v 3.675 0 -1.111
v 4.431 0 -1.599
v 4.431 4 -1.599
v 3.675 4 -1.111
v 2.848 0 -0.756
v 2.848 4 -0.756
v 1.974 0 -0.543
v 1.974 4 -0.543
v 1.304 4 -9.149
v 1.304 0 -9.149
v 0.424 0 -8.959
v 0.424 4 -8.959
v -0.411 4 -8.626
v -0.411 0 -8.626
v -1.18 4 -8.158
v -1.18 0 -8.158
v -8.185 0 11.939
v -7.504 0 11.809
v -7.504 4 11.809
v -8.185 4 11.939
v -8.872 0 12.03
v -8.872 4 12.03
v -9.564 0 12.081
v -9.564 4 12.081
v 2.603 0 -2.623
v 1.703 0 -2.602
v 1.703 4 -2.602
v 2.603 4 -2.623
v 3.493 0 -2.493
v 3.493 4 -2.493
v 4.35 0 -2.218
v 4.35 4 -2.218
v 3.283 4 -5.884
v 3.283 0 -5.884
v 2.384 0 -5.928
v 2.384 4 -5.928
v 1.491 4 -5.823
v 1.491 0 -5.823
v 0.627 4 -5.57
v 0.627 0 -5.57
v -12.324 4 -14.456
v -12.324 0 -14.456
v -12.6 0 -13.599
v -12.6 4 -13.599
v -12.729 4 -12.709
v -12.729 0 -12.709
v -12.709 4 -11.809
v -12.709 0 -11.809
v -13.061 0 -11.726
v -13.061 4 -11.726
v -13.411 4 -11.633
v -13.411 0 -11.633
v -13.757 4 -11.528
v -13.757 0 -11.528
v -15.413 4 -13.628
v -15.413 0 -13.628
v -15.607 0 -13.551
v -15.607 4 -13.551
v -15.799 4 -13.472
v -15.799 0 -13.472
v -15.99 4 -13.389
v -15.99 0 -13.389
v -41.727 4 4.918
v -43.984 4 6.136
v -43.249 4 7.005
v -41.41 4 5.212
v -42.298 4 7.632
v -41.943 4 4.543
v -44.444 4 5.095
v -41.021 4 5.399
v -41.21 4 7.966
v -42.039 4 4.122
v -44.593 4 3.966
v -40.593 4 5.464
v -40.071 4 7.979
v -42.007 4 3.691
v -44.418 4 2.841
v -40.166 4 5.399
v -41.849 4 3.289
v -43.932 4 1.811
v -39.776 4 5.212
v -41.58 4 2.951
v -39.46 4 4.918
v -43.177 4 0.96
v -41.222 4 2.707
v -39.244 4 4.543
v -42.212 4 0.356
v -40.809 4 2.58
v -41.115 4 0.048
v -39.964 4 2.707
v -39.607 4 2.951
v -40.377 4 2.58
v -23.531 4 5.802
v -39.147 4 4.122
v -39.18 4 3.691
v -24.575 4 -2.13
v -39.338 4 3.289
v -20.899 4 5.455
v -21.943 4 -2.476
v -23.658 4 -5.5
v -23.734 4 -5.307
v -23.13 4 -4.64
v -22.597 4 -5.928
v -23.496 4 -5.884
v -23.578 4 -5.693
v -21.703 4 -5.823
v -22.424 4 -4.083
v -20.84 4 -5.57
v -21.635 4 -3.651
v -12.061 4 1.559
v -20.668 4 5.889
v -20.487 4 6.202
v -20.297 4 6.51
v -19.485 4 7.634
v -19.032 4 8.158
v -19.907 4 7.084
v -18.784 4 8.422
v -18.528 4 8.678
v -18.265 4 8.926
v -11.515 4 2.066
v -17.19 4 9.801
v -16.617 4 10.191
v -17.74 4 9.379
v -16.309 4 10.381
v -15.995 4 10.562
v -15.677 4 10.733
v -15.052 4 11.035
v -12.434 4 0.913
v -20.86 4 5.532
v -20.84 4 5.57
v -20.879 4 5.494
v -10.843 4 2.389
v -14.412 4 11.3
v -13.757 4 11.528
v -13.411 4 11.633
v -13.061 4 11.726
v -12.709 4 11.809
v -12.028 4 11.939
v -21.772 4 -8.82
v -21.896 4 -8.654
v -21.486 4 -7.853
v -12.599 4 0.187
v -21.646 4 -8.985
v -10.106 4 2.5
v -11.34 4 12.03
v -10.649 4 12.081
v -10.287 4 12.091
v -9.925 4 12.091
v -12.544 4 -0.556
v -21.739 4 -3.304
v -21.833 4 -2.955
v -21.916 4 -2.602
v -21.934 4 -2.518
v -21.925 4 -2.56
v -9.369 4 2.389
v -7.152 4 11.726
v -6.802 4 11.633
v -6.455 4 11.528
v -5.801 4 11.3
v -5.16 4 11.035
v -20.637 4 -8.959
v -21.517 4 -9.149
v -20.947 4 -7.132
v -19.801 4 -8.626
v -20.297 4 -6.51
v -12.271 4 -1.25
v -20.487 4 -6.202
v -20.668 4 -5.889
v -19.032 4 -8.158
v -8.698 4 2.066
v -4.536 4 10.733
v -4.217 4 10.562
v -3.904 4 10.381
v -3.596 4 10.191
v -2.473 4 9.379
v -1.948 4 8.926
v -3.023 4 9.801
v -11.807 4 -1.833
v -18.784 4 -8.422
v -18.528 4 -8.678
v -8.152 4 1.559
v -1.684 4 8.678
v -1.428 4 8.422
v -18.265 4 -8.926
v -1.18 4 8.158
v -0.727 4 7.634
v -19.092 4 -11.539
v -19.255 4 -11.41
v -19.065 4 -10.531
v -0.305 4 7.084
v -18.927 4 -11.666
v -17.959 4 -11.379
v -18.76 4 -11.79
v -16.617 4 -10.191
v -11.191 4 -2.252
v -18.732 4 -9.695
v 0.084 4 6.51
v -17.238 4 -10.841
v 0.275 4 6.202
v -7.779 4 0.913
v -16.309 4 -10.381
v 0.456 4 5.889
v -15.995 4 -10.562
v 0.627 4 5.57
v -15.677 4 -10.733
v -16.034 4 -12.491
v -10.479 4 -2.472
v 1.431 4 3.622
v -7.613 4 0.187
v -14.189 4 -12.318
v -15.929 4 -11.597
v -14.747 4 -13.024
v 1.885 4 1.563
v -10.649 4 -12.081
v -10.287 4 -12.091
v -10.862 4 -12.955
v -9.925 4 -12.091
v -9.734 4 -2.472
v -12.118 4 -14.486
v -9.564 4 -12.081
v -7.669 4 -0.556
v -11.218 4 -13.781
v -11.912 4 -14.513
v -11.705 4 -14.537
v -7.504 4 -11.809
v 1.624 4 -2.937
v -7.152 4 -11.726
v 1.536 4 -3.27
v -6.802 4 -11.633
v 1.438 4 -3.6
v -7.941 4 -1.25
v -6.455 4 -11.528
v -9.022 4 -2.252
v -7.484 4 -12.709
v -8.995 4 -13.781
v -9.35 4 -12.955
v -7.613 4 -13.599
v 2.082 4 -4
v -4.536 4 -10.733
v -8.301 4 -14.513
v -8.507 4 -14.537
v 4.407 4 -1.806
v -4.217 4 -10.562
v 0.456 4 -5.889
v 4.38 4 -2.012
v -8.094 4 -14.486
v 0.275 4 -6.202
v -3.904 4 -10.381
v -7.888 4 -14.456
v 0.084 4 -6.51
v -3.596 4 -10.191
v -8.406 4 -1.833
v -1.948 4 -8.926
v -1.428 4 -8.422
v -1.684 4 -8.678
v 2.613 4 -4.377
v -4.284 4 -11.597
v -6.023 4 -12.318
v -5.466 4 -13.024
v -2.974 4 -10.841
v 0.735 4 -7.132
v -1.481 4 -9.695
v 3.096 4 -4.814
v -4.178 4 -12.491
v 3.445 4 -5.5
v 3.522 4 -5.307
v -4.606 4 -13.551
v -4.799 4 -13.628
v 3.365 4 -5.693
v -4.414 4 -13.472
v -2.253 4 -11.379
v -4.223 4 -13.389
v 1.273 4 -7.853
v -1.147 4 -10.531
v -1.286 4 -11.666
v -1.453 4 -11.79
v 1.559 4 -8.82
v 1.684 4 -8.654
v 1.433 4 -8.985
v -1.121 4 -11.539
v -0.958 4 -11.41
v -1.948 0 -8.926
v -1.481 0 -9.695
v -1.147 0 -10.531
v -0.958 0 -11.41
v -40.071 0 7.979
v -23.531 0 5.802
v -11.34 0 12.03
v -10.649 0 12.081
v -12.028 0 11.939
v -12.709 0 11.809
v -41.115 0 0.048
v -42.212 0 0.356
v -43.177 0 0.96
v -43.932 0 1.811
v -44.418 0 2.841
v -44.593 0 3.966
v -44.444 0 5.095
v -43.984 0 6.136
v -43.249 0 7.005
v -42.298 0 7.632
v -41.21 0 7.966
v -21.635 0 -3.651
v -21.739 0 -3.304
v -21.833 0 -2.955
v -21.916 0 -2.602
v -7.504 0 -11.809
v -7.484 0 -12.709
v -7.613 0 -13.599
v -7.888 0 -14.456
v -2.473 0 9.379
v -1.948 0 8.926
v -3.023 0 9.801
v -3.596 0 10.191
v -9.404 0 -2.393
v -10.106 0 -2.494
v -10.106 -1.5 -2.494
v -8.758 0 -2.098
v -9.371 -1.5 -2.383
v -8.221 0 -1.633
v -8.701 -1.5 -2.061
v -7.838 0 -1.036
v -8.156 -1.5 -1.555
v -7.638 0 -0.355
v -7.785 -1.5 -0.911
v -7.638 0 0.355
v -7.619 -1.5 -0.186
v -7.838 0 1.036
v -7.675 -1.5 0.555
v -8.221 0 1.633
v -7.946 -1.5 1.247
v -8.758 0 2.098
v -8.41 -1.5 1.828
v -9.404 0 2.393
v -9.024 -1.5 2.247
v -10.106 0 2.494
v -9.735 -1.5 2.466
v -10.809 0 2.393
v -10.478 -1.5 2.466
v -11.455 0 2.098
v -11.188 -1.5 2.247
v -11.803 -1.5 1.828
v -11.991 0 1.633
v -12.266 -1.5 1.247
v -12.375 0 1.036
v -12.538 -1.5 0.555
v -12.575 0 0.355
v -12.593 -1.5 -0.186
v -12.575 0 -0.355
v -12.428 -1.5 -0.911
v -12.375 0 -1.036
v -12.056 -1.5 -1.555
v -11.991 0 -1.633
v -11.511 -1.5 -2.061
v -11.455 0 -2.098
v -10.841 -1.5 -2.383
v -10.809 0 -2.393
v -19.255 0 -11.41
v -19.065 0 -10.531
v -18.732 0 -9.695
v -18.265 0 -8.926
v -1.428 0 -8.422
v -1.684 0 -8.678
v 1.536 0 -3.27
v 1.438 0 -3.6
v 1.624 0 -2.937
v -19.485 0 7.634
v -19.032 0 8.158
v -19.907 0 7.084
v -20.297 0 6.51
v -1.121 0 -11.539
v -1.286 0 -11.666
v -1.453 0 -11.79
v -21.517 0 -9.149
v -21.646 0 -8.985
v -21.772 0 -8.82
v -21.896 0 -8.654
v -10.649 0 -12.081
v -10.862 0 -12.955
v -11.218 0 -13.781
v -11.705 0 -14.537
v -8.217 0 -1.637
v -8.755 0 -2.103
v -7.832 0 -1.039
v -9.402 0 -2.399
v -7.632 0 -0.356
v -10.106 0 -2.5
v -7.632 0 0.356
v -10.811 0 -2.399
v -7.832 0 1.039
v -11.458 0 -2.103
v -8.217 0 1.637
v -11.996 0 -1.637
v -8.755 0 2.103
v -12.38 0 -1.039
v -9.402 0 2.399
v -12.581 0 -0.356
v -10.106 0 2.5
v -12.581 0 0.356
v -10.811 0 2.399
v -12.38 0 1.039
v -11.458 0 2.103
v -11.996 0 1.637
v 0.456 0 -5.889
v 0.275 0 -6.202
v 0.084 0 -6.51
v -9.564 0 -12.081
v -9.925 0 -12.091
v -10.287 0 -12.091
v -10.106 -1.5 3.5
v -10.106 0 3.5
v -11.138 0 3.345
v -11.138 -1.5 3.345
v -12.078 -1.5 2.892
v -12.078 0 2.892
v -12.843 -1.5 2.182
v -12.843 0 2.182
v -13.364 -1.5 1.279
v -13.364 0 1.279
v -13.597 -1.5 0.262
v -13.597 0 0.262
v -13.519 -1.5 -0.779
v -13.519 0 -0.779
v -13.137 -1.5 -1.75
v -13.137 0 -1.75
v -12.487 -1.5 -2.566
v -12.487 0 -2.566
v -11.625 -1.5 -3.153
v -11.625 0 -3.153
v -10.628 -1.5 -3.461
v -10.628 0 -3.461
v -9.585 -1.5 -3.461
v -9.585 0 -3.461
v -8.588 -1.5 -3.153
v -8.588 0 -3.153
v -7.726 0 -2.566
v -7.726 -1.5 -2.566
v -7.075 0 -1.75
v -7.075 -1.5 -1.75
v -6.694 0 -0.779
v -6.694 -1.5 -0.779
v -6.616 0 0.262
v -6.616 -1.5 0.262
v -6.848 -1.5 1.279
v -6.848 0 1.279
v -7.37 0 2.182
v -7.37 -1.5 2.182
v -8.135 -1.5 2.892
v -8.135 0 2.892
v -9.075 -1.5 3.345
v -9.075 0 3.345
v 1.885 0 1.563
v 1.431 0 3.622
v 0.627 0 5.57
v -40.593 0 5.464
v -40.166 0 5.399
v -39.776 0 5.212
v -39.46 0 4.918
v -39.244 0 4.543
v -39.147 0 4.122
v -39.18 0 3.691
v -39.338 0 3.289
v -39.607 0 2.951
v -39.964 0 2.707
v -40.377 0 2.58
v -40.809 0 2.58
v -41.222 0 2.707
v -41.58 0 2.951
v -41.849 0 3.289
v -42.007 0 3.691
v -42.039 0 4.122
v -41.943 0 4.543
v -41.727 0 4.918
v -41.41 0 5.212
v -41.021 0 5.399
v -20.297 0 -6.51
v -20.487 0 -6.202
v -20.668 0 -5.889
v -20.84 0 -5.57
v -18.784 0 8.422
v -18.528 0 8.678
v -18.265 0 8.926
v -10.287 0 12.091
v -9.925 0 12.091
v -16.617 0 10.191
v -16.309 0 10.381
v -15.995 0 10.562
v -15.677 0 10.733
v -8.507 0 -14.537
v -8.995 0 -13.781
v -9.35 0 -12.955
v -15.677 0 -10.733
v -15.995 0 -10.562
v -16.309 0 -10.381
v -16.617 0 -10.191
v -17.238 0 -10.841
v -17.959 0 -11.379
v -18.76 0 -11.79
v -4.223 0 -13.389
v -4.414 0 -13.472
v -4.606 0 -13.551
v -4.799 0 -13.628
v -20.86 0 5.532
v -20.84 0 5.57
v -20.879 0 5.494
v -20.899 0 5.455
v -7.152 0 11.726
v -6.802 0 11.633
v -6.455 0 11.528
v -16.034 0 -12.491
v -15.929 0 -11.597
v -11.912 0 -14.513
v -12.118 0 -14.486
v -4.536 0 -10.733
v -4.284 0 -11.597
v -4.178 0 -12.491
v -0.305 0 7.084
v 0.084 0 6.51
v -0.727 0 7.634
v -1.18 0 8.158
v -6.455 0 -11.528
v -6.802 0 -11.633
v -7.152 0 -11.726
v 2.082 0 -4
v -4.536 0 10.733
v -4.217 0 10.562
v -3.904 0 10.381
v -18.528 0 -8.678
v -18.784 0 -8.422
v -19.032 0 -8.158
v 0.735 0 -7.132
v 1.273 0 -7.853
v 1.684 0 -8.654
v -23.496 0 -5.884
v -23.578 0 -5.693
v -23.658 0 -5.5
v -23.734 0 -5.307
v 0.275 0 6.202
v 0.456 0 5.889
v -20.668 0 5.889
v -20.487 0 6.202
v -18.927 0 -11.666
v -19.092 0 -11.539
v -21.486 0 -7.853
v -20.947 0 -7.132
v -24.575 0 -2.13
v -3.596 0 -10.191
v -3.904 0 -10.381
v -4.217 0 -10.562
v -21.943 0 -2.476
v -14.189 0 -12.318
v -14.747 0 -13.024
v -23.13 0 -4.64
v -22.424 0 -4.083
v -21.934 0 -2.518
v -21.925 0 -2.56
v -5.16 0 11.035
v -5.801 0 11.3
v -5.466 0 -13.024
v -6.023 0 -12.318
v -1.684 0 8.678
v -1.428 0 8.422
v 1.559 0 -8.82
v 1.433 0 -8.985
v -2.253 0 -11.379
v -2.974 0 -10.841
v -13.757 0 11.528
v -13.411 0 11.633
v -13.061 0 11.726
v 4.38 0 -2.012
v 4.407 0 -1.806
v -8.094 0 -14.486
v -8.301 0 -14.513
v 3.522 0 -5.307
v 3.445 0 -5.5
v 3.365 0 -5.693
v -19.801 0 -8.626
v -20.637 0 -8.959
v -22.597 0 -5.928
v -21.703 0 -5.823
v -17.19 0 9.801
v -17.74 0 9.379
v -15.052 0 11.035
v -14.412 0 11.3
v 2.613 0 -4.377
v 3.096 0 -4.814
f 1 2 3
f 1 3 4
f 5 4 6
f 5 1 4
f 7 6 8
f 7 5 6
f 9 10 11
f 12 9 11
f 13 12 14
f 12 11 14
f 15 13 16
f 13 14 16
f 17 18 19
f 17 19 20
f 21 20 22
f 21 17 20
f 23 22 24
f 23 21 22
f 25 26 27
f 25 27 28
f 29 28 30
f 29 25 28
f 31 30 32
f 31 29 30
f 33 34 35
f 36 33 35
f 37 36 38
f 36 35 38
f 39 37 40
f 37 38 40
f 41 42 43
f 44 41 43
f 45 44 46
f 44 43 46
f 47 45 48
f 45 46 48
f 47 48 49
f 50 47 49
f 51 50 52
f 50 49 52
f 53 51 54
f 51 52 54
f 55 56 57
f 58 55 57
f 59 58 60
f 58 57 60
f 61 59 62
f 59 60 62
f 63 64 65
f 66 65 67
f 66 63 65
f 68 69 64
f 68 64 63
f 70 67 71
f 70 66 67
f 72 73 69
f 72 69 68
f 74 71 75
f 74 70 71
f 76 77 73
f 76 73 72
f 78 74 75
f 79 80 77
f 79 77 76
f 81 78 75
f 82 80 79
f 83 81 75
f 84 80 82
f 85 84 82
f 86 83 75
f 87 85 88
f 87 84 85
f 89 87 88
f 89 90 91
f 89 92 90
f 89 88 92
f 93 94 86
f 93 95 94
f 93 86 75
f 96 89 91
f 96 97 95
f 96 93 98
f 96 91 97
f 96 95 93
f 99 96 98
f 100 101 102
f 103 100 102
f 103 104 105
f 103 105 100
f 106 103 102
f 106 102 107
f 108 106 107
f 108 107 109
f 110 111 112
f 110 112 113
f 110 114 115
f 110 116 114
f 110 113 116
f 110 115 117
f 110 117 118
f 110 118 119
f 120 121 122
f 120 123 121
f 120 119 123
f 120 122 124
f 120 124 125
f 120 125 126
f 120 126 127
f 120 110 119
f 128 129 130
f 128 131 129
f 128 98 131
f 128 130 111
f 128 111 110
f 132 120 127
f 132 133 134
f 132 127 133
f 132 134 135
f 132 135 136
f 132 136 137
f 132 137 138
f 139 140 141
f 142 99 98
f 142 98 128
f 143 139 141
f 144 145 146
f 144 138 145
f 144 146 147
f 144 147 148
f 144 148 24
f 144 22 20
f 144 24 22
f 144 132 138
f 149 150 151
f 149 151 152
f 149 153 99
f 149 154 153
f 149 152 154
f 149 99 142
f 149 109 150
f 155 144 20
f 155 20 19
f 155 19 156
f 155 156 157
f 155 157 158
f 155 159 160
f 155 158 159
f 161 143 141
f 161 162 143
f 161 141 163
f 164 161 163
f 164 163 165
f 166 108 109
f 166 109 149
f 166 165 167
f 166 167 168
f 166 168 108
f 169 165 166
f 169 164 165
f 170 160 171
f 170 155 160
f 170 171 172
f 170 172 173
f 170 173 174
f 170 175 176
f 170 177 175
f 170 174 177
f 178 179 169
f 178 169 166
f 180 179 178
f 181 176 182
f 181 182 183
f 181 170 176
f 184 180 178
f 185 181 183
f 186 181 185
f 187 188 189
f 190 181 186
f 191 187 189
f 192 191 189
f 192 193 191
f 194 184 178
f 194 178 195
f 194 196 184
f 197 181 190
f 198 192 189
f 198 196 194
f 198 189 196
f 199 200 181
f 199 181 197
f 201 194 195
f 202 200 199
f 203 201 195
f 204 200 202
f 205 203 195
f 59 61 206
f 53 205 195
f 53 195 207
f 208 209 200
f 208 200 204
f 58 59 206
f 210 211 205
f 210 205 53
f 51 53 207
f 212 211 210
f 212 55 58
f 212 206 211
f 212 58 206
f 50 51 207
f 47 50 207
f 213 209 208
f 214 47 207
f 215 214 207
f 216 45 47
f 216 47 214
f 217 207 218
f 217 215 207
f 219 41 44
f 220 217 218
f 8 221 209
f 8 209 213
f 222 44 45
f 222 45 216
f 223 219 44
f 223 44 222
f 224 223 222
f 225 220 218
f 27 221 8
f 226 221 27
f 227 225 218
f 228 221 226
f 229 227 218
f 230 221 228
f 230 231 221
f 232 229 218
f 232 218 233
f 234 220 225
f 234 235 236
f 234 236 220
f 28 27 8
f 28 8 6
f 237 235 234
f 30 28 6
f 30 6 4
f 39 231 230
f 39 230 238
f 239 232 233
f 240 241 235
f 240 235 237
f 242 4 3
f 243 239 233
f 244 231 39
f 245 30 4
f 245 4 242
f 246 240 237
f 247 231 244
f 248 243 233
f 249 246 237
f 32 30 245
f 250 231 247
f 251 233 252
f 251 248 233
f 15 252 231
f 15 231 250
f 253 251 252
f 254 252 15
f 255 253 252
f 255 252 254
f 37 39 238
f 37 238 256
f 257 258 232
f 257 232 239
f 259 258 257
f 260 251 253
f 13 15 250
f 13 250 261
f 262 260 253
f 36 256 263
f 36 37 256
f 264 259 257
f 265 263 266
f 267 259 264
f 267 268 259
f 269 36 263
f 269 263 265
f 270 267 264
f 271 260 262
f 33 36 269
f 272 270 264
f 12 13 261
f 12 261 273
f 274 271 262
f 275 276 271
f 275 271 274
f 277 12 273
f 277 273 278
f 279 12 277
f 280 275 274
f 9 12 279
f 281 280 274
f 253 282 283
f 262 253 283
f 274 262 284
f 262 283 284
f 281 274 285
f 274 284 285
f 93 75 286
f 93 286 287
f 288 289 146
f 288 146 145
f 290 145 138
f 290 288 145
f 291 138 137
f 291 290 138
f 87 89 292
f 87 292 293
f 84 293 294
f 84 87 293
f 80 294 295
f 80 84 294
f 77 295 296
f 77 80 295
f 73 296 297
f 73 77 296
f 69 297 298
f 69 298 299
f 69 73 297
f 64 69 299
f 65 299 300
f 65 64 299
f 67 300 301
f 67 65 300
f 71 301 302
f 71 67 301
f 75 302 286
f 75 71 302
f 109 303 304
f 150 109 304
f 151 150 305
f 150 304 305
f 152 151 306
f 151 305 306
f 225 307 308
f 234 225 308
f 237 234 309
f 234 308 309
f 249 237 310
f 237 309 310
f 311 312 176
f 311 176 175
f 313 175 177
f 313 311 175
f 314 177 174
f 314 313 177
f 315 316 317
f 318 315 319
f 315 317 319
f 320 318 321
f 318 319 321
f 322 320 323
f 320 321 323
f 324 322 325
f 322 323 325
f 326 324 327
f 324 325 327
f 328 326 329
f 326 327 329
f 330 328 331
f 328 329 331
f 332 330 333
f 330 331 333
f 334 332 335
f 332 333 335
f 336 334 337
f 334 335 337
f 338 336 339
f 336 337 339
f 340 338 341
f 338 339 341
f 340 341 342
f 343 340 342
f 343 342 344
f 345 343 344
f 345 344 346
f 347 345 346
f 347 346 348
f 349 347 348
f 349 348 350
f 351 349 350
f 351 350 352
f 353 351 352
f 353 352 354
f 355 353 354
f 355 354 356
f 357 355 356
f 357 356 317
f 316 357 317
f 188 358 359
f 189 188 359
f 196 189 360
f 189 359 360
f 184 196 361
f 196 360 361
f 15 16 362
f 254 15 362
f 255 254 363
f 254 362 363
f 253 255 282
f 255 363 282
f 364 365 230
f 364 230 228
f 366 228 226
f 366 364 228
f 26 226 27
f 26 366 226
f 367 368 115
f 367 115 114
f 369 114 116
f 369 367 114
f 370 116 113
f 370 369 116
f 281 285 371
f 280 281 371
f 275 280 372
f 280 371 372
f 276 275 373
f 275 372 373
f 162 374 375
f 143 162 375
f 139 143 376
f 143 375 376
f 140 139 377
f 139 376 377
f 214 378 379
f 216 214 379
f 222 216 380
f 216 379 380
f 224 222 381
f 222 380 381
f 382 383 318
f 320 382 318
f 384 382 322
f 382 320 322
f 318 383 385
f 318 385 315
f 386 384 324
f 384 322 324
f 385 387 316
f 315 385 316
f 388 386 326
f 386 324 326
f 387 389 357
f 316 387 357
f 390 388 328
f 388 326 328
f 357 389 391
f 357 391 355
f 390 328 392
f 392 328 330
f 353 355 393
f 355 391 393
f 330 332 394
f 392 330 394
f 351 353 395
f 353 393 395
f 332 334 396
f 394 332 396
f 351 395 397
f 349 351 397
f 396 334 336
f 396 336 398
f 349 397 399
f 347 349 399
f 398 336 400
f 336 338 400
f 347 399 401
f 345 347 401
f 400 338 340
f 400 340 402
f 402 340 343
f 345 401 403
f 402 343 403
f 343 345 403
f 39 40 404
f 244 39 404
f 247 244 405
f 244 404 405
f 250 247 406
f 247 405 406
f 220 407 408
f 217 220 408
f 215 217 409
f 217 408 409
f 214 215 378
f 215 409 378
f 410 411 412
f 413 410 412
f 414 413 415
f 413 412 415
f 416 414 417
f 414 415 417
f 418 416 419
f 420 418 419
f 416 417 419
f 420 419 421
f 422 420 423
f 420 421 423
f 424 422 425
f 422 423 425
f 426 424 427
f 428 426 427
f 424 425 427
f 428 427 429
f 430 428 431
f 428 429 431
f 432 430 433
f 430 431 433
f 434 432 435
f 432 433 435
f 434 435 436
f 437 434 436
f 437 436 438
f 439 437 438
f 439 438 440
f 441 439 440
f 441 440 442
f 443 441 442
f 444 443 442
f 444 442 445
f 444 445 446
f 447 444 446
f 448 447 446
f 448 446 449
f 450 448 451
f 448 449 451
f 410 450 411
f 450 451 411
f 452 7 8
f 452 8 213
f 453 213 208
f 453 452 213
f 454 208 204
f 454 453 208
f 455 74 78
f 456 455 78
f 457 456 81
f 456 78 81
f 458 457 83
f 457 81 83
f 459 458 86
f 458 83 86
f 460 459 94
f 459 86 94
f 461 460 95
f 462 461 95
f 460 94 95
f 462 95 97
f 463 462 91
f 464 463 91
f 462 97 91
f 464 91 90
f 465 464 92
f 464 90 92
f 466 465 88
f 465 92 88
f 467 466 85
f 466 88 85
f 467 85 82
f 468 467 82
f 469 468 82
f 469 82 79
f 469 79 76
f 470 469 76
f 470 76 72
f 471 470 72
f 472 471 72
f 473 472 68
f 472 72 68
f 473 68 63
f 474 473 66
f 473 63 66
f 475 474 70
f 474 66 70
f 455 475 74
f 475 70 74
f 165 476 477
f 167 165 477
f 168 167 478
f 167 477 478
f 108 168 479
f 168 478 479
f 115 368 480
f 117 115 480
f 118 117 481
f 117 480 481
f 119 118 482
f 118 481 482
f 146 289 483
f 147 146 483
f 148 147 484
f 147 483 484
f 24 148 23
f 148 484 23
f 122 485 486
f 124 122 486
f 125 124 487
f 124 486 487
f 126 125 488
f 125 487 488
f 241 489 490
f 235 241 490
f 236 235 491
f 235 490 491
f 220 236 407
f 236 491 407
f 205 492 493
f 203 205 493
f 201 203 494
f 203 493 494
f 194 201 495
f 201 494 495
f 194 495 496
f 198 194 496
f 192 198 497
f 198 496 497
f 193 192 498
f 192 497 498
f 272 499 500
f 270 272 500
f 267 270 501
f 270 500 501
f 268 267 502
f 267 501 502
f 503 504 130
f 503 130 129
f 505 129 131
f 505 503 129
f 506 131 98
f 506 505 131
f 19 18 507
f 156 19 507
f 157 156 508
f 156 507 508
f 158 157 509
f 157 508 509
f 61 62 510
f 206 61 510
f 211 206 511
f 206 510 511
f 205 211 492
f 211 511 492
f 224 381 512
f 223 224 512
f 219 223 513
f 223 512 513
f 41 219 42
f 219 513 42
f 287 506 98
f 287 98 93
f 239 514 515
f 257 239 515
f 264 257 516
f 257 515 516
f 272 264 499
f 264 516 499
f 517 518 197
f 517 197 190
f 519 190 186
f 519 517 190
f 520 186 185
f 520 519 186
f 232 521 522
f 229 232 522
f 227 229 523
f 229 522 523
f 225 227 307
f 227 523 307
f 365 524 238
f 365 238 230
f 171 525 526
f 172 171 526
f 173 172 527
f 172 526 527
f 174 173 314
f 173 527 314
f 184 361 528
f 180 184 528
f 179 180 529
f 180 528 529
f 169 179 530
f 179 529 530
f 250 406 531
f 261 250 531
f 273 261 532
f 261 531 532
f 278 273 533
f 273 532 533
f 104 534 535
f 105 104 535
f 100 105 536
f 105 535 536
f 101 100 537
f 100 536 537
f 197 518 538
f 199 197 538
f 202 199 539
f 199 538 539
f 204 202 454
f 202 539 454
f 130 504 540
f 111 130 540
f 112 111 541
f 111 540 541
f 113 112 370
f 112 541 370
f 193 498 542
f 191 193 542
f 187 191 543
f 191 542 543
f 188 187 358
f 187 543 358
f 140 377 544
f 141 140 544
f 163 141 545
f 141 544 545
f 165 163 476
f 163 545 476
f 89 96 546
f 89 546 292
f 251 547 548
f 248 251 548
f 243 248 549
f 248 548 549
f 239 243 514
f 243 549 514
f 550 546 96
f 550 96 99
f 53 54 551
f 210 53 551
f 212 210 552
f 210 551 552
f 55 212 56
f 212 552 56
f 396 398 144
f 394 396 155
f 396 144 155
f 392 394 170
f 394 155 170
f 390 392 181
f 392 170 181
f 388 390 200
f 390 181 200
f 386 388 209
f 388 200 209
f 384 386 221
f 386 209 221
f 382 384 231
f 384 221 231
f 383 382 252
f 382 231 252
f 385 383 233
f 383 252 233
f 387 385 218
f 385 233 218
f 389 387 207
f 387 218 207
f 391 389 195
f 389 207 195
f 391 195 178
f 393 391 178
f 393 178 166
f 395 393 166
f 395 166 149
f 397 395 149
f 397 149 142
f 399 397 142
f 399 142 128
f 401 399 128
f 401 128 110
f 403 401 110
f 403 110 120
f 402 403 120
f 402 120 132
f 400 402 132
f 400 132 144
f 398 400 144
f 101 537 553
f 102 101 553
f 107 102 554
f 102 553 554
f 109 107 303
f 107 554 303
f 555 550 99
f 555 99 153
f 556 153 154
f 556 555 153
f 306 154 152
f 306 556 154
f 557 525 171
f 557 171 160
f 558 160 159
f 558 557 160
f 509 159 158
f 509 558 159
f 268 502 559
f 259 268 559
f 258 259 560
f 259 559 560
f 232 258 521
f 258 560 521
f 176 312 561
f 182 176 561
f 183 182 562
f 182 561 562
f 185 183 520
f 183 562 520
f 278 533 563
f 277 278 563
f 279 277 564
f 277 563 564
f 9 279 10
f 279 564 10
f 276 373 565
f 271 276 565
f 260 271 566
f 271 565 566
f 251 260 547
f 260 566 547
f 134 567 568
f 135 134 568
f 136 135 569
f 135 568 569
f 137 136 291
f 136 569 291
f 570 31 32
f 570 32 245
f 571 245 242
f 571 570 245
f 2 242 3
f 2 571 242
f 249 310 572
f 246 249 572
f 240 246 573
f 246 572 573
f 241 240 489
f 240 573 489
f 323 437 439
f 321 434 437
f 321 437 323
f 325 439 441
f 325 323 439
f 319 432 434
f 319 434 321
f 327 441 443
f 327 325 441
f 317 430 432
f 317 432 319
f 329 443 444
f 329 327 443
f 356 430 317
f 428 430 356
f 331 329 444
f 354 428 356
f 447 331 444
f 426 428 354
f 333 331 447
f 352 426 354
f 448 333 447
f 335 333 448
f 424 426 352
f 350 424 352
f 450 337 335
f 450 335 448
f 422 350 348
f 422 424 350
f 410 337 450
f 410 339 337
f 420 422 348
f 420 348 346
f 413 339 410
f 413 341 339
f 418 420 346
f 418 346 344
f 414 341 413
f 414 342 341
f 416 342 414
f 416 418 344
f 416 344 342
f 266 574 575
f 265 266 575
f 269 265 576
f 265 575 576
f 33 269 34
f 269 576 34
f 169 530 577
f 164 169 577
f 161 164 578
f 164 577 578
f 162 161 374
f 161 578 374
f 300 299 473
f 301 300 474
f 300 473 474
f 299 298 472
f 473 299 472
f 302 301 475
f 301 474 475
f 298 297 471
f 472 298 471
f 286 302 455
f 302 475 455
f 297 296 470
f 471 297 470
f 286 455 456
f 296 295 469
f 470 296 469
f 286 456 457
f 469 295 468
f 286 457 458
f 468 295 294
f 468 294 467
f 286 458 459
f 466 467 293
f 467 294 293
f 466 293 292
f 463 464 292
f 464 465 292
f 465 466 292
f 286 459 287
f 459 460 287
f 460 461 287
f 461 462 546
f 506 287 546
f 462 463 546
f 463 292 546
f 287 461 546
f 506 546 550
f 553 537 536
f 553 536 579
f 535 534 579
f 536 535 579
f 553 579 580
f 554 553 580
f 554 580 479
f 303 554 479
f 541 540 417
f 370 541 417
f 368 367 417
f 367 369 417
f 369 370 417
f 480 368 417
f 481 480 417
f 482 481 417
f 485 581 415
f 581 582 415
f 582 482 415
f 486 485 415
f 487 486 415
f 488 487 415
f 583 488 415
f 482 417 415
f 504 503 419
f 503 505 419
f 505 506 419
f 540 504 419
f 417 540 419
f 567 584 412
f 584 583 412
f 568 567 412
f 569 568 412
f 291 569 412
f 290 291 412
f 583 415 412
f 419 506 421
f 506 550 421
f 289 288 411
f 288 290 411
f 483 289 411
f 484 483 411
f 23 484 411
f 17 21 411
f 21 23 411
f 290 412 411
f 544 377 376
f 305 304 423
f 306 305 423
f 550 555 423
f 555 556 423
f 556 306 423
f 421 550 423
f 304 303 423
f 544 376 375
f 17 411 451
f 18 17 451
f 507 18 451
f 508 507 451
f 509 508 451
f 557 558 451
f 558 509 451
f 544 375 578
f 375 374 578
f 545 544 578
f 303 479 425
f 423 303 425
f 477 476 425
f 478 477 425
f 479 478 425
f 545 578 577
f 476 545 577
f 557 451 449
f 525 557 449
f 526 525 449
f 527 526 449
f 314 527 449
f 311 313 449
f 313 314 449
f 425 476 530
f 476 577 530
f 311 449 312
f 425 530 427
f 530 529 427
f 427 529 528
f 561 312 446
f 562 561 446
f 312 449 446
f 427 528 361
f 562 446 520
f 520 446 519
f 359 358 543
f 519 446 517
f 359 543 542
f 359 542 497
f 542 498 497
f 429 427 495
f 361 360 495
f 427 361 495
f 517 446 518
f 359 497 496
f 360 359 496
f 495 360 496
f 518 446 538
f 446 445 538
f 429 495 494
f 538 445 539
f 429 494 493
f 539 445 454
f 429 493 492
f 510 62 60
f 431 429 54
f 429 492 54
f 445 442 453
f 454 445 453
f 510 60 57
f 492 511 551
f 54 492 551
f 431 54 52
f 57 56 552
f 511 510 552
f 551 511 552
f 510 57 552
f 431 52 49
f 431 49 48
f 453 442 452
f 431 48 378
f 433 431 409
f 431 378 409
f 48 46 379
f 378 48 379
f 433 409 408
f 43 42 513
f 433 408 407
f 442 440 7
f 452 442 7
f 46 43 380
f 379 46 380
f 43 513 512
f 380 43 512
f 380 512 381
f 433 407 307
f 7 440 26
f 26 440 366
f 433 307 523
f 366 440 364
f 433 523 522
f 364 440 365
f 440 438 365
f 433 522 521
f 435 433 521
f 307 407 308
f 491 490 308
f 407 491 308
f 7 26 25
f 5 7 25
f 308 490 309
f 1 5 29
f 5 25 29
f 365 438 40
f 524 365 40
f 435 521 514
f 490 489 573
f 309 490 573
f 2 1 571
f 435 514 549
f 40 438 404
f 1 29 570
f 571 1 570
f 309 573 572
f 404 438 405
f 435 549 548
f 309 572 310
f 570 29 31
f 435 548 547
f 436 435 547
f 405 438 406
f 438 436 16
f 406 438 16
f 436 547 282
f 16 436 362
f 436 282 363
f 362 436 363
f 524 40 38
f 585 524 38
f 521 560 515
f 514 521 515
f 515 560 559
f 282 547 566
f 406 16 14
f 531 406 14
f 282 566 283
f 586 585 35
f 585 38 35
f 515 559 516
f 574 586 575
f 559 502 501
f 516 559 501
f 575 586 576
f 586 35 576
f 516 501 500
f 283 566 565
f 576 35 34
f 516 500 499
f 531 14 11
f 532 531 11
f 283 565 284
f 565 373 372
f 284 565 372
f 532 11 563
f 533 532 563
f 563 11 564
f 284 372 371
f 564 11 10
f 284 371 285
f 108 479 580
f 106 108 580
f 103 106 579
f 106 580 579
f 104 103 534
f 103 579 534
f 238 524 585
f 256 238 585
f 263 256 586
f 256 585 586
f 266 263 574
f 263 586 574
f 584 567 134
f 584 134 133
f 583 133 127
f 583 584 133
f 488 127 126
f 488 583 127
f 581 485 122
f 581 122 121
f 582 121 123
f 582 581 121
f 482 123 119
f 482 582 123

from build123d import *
from build123d.topology import SkipClean

# Parameters (mm, degrees)
SKETCH1_R           = 1.5
BOSS_EXTRUDE1_DEPTH = 4
SKETCH3_R           = 1.45
BOSS_EXTRUDE2_DEPTH = 4
CUT_EXTRUDE1_START  = -4
CUT_EXTRUDE1_DEPTH  = 4
CUT_EXTRUDE2_REACH  = 49.073
SKETCH5_R           = 2.5
SKETCH6_R           = 3.5
BOSS_EXTRUDE3_DEPTH = 1.5
SKETCH7_R           = 2.494074769
CUT_EXTRUDE3_DEPTH  = 48.224394497


with BuildPart() as part:
    # Sketch1 → Boss-Extrude1 (new body)
    with BuildSketch(Plane(origin=(0, 0, 0), x_dir=(1, 0, 0), z_dir=(0, 1, 0))):
        with BuildLine():
            Line((20.643657446, 4), (2.081641936, 4))
            ThreePointArc((2.081641936, 4), (2.861028333, 4.588201733), (3.521749436, 5.30713988))
            ThreePointArc((3.521749436, 5.30713988), (3.405395609, 5.596745198), (3.282888305, 5.883801663))
            ThreePointArc((3.282888305, 5.883801663), (1.93527598, 5.894040025), (0.627094961, 5.57027124))
            ThreePointArc((0.627094961, 5.57027124), (0.366286148, 6.046375), (0.084372603, 6.510293938))
            ThreePointArc((0.084372603, 6.510293938), (1.018855105, 7.48132754), (1.683794586, 8.65351323))
            ThreePointArc((1.683794586, 8.65351323), (1.496450048, 8.903135899), (1.303821399, 9.148703928))
            ThreePointArc((1.303821399, 9.148703928), (-0.000522033, 8.809805691), (-1.180330337, 8.158486898))
            ThreePointArc((-1.180330337, 8.158486898), (-1.555477026, 8.550865528), (-1.947855656, 8.926012217))
            ThreePointArc((-1.947855656, 8.926012217), (-1.296536862, 10.105820521), (-0.957638625, 11.410163953))
            ThreePointArc((-0.957638625, 11.410163953), (-1.203206655, 11.602792602), (-1.452829324, 11.79013714))
            ThreePointArc((-1.452829324, 11.79013714), (-2.625015014, 11.125197659), (-3.596048616, 10.190715157))
            ThreePointArc((-3.596048616, 10.190715157), (-4.059967554, 10.472628702), (-4.536071314, 10.733437515))
            ThreePointArc((-4.536071314, 10.733437515), (-4.212302529, 12.041618533), (-4.222540891, 13.389230859))
            ThreePointArc((-4.222540891, 13.389230859), (-4.509597355, 13.511738163), (-4.799202674, 13.62809199))
            ThreePointArc((-4.799202674, 13.62809199), (-5.759348103, 12.682425791), (-6.455432668, 11.528463019))
            ThreePointArc((-6.455432668, 11.528463019), (-6.976508546, 11.680699536), (-7.503891752, 11.809396783))
            ThreePointArc((-7.503891752, 11.809396783), (-7.529737283, 13.156800143), (-7.888414517, 14.455843809))
            ThreePointArc((-7.888414517, 14.455843809), (-8.197396993, 14.499881098), (-8.507248835, 14.537314892))
            ThreePointArc((-8.507248835, 14.537314892), (-9.18992168, 13.375367565), (-9.563620196, 12.080565177))
            ThreePointArc((-9.563620196, 12.080565177), (-10.106342554, 12.09275), (-10.649064912, 12.080565177))
            ThreePointArc((-10.649064912, 12.080565177), (-11.022763428, 13.375367565), (-11.705436272, 14.537314892))
            ThreePointArc((-11.705436272, 14.537314892), (-12.015288115, 14.499881098), (-12.324270591, 14.455843809))
            ThreePointArc((-12.324270591, 14.455843809), (-12.682947825, 13.156800143), (-12.708793355, 11.809396783))
            ThreePointArc((-12.708793355, 11.809396783), (-13.236176561, 11.680699536), (-13.757252439, 11.528463019))
            ThreePointArc((-13.757252439, 11.528463019), (-14.453337005, 12.682425791), (-15.413482434, 13.62809199))
            ThreePointArc((-15.413482434, 13.62809199), (-15.703087752, 13.511738163), (-15.990144217, 13.389230859))
            ThreePointArc((-15.990144217, 13.389230859), (-16.000382579, 12.041618533), (-15.676613793, 10.733437515))
            ThreePointArc((-15.676613793, 10.733437515), (-16.152717554, 10.472628702), (-16.616636492, 10.190715157))
            ThreePointArc((-16.616636492, 10.190715157), (-17.587670094, 11.125197659), (-18.759855783, 11.79013714))
            ThreePointArc((-18.759855783, 11.79013714), (-19.009478453, 11.602792602), (-19.255046482, 11.410163953))
            ThreePointArc((-19.255046482, 11.410163953), (-18.916148245, 10.105820521), (-18.264829452, 8.926012217))
            ThreePointArc((-18.264829452, 8.926012217), (-18.657208082, 8.550865528), (-19.032354771, 8.158486898))
            ThreePointArc((-19.032354771, 8.158486898), (-20.212163074, 8.809805691), (-21.516506507, 9.148703928))
            ThreePointArc((-21.516506507, 9.148703928), (-21.709135156, 8.903135899), (-21.896479694, 8.65351323))
            ThreePointArc((-21.896479694, 8.65351323), (-21.231540213, 7.48132754), (-20.297057711, 6.510293938))
            ThreePointArc((-20.297057711, 6.510293938), (-20.578971255, 6.046375), (-20.839780068, 5.57027124))
            ThreePointArc((-20.839780068, 5.57027124), (-22.147961087, 5.894040025), (-23.495573413, 5.883801663))
            ThreePointArc((-23.495573413, 5.883801663), (-23.618080717, 5.596745198), (-23.734434544, 5.30713988))
            ThreePointArc((-23.734434544, 5.30713988), (-22.788768345, 4.346994451), (-21.634805572, 3.650909885))
            ThreePointArc((-21.634805572, 3.650909885), (-21.78704209, 3.129834008), (-21.915739337, 2.602450802))
            ThreePointArc((-21.915739337, 2.602450802), (-23.263142697, 2.576605271), (-24.562186363, 2.217928037))
            ThreePointArc((-24.562186363, 2.217928037), (-24.606223651, 1.908945561), (-24.643657446, 1.599093719))
            ThreePointArc((-24.643657446, 1.599093719), (-23.481710119, 0.916420874), (-22.186907731, 0.542722358))
            ThreePointArc((-22.186907731, 0.542722358), (-22.199092554, 0), (-22.186907731, -0.542722358))
            ThreePointArc((-22.186907731, -0.542722358), (-23.481710119, -0.916420874), (-24.643657446, -1.599093719))
            ThreePointArc((-24.643657446, -1.599093719), (-24.606223651, -1.908945561), (-24.562186363, -2.217928037))
            ThreePointArc((-24.562186363, -2.217928037), (-23.263142697, -2.576605271), (-21.915739337, -2.602450802))
            ThreePointArc((-21.915739337, -2.602450802), (-21.78704209, -3.129834008), (-21.634805572, -3.650909885))
            ThreePointArc((-21.634805572, -3.650909885), (-22.788768345, -4.346994451), (-23.734434544, -5.30713988))
            ThreePointArc((-23.734434544, -5.30713988), (-23.618080717, -5.596745198), (-23.495573413, -5.883801663))
            ThreePointArc((-23.495573413, -5.883801663), (-22.147961087, -5.894040025), (-20.839780068, -5.57027124))
            ThreePointArc((-20.839780068, -5.57027124), (-20.578971255, -6.046375), (-20.297057711, -6.510293938))
            ThreePointArc((-20.297057711, -6.510293938), (-21.231540213, -7.48132754), (-21.896479694, -8.65351323))
            ThreePointArc((-21.896479694, -8.65351323), (-21.709135156, -8.903135899), (-21.516506507, -9.148703928))
            ThreePointArc((-21.516506507, -9.148703928), (-20.212163074, -8.809805691), (-19.032354771, -8.158486898))
            ThreePointArc((-19.032354771, -8.158486898), (-18.657208082, -8.550865528), (-18.264829452, -8.926012217))
            ThreePointArc((-18.264829452, -8.926012217), (-18.916148245, -10.105820521), (-19.255046482, -11.410163953))
            ThreePointArc((-19.255046482, -11.410163953), (-19.009478453, -11.602792602), (-18.759855783, -11.79013714))
            ThreePointArc((-18.759855783, -11.79013714), (-17.587670094, -11.125197659), (-16.616636492, -10.190715157))
            ThreePointArc((-16.616636492, -10.190715157), (-16.152717554, -10.472628702), (-15.676613793, -10.733437515))
            ThreePointArc((-15.676613793, -10.733437515), (-16.000382579, -12.041618533), (-15.990144217, -13.389230859))
            ThreePointArc((-15.990144217, -13.389230859), (-15.703087752, -13.511738163), (-15.413482434, -13.62809199))
            ThreePointArc((-15.413482434, -13.62809199), (-14.453337005, -12.682425791), (-13.757252439, -11.528463019))
            ThreePointArc((-13.757252439, -11.528463019), (-13.236176561, -11.680699536), (-12.708793355, -11.809396783))
            ThreePointArc((-12.708793355, -11.809396783), (-12.682947825, -13.156800143), (-12.324270591, -14.455843809))
            ThreePointArc((-12.324270591, -14.455843809), (-12.015288115, -14.499881098), (-11.705436272, -14.537314892))
            ThreePointArc((-11.705436272, -14.537314892), (-11.022763428, -13.375367565), (-10.649064912, -12.080565177))
            ThreePointArc((-10.649064912, -12.080565177), (-10.106342554, -12.09275), (-9.563620196, -12.080565177))
            ThreePointArc((-9.563620196, -12.080565177), (-9.18992168, -13.375367565), (-8.507248835, -14.537314892))
            ThreePointArc((-8.507248835, -14.537314892), (-8.197396993, -14.499881098), (-7.888414517, -14.455843809))
            ThreePointArc((-7.888414517, -14.455843809), (-7.529737283, -13.156800143), (-7.503891752, -11.809396783))
            ThreePointArc((-7.503891752, -11.809396783), (-6.976508546, -11.680699536), (-6.455432668, -11.528463019))
            ThreePointArc((-6.455432668, -11.528463019), (-5.759348103, -12.682425791), (-4.799202674, -13.62809199))
            ThreePointArc((-4.799202674, -13.62809199), (-4.509597355, -13.511738163), (-4.222540891, -13.389230859))
            ThreePointArc((-4.222540891, -13.389230859), (-4.212302529, -12.041618533), (-4.536071314, -10.733437515))
            ThreePointArc((-4.536071314, -10.733437515), (-4.059967554, -10.472628702), (-3.596048616, -10.190715157))
            ThreePointArc((-3.596048616, -10.190715157), (-2.625015014, -11.125197659), (-1.452829324, -11.79013714))
            ThreePointArc((-1.452829324, -11.79013714), (-1.203206655, -11.602792602), (-0.957638625, -11.410163953))
            ThreePointArc((-0.957638625, -11.410163953), (-1.296536862, -10.105820521), (-1.947855656, -8.926012217))
            ThreePointArc((-1.947855656, -8.926012217), (-1.555477026, -8.550865528), (-1.180330337, -8.158486898))
            ThreePointArc((-1.180330337, -8.158486898), (-0.000522033, -8.809805691), (1.303821399, -9.148703928))
            ThreePointArc((1.303821399, -9.148703928), (1.496450048, -8.903135899), (1.683794586, -8.65351323))
            ThreePointArc((1.683794586, -8.65351323), (1.018855105, -7.48132754), (0.084372603, -6.510293938))
            ThreePointArc((0.084372603, -6.510293938), (0.366286148, -6.046375), (0.627094961, -5.57027124))
            ThreePointArc((0.627094961, -5.57027124), (1.93527598, -5.894040025), (3.282888305, -5.883801663))
            ThreePointArc((3.282888305, -5.883801663), (3.405395609, -5.596745198), (3.521749436, -5.30713988))
            ThreePointArc((3.521749436, -5.30713988), (2.861028333, -4.588201733), (2.081641936, -4))
            Line((2.081641936, -4), (20.643657446, -4))
            ThreePointArc((20.643657446, -4), (24.643657446, 0), (20.643657446, 4))
        make_face()
        with Locations(Location((-10.106342554, 0, 0), (0, 0, 270))):
            Circle(SKETCH1_R, mode=Mode.SUBTRACT)
        with Locations(Location((20.643657446, 0, 0), (0, 0, 270))):
            Circle(SKETCH1_R, mode=Mode.SUBTRACT)
    extrude(amount=BOSS_EXTRUDE1_DEPTH)

    # Sketch3 → Boss-Extrude2 (add)
    with BuildSketch(Plane(origin=(0, 4, 0), x_dir=(1, 0, 0), z_dir=(0, 1, 0))):
        with BuildLine():
            ThreePointArc((-9.584237785, -3.965779445), (-14.072121999, -0.522104769), (-10.628447323, 3.965779445))
            Line((-10.628447323, 3.965779445), (-41.11537681, -0.047900965))
            ThreePointArc((-41.11537681, -0.047900965), (-44.559051487, -4.53578518), (-40.071167272, -7.979459856))
            Line((-40.071167272, -7.979459856), (-9.584237785, -3.965779445))
        make_face()
        with Locations(Location((-40.593272041, -4.013680411, 0), (0, 0, 270))):
            Circle(SKETCH3_R, mode=Mode.SUBTRACT)
    extrude(amount=-BOSS_EXTRUDE2_DEPTH)

    # Sketch4 → Cut-Extrude1 (cut)
    with SkipClean():  # the faces are left unmerged after this step: merging them gives an invalid solid
        with BuildSketch(Plane(origin=(0, 4, 0), x_dir=(1, 0, 0), z_dir=(0, 1, 0)).offset(CUT_EXTRUDE1_START)):
            with BuildLine():
                ThreePointArc((20.643657446, -4), (24.643657446, 0), (20.643657446, 4))
                Line((20.643657446, 4), (2.081641936, 4))
                Line((2.081641936, 4), (1.43808022, 3.600125745))
                ThreePointArc((1.43808022, 3.600125745), (1.581217534, 3.104116905), (1.70305423, 2.602450802))
                ThreePointArc((1.70305423, 2.602450802), (3.050457589, 2.576605271), (4.349501255, 2.217928037))
                ThreePointArc((4.349501255, 2.217928037), (4.393538544, 1.908945561), (4.430972339, 1.599093719))
                ThreePointArc((4.430972339, 1.599093719), (3.269025011, 0.916420874), (1.974222624, 0.542722358))
                ThreePointArc((1.974222624, 0.542722358), (1.70305423, -2.602450802), (0.627094961, -5.57027124))
                ThreePointArc((0.627094961, -5.57027124), (1.93527598, -5.894040025), (3.282888305, -5.883801663))
                ThreePointArc((3.282888305, -5.883801663), (3.405395609, -5.596745198), (3.521749436, -5.30713988))
                ThreePointArc((3.521749436, -5.30713988), (2.861028333, -4.588201733), (2.081641936, -4))
                Line((2.081641936, -4), (20.643657446, -4))
            make_face()
            with BuildLine():
                ThreePointArc((1.683794586, -8.65351323), (1.018855105, -7.48132754), (0.084372603, -6.510293938))
                ThreePointArc((0.084372603, -6.510293938), (-0.512518948, -7.361599771), (-1.180330337, -8.158486898))
                ThreePointArc((-1.180330337, -8.158486898), (-0.000522033, -8.809805691), (1.303821399, -9.148703928))
                ThreePointArc((1.303821399, -9.148703928), (1.496450048, -8.903135899), (1.683794586, -8.65351323))
            make_face()
            with BuildLine():
                ThreePointArc((-0.957638625, -11.410163953), (-1.296536862, -10.105820521), (-1.947855656, -8.926012217))
                ThreePointArc((-1.947855656, -8.926012217), (-2.744742783, -9.593823606), (-3.596048616, -10.190715157))
                ThreePointArc((-3.596048616, -10.190715157), (-2.625015014, -11.125197659), (-1.452829324, -11.79013714))
                ThreePointArc((-1.452829324, -11.79013714), (-1.203206655, -11.602792602), (-0.957638625, -11.410163953))
            make_face()
            with BuildLine():
                ThreePointArc((-4.222540891, -13.389230859), (-4.212302529, -12.041618533), (-4.536071314, -10.733437515))
                ThreePointArc((-4.536071314, -10.733437515), (-5.478647477, -11.172244217), (-6.455432668, -11.528463019))
                ThreePointArc((-6.455432668, -11.528463019), (-5.759348103, -12.682425791), (-4.799202674, -13.62809199))
                ThreePointArc((-4.799202674, -13.62809199), (-4.509597355, -13.511738163), (-4.222540891, -13.389230859))
            make_face()
            with BuildLine():
                ThreePointArc((-7.888414517, -14.455843809), (-7.529737283, -13.156800143), (-7.503891752, -11.809396783))
                ThreePointArc((-7.503891752, -11.809396783), (-8.527921943, -11.989294847), (-9.563620196, -12.080565177))
                ThreePointArc((-9.563620196, -12.080565177), (-9.18992168, -13.375367565), (-8.507248835, -14.537314892))
                ThreePointArc((-8.507248835, -14.537314892), (-8.197396993, -14.499881098), (-7.888414517, -14.455843809))
            make_face()
            with BuildLine():
                ThreePointArc((-11.705436272, -14.537314892), (-11.022763428, -13.375367565), (-10.649064912, -12.080565177))
                ThreePointArc((-10.649064912, -12.080565177), (-11.684763165, -11.989294847), (-12.708793355, -11.809396783))
                ThreePointArc((-12.708793355, -11.809396783), (-12.682947825, -13.156800143), (-12.324270591, -14.455843809))
                ThreePointArc((-12.324270591, -14.455843809), (-12.015288115, -14.499881098), (-11.705436272, -14.537314892))
            make_face()
            with BuildLine():
                ThreePointArc((-15.413482434, -13.62809199), (-14.453337005, -12.682425791), (-13.757252439, -11.528463019))
                ThreePointArc((-13.757252439, -11.528463019), (-14.734037631, -11.172244217), (-15.676613793, -10.733437515))
                ThreePointArc((-15.676613793, -10.733437515), (-16.000382579, -12.041618533), (-15.990144217, -13.389230859))
                ThreePointArc((-15.990144217, -13.389230859), (-15.703087752, -13.511738163), (-15.413482434, -13.62809199))
            make_face()
            with BuildLine():
                ThreePointArc((-18.759855783, -11.79013714), (-17.587670094, -11.125197659), (-16.616636492, -10.190715157))
                ThreePointArc((-16.616636492, -10.190715157), (-17.467942324, -9.593823606), (-18.264829452, -8.926012217))
                ThreePointArc((-18.264829452, -8.926012217), (-18.916148245, -10.105820521), (-19.255046482, -11.410163953))
                ThreePointArc((-19.255046482, -11.410163953), (-19.009478453, -11.602792602), (-18.759855783, -11.79013714))
            make_face()
            with BuildLine():
                ThreePointArc((-21.516506507, -9.148703928), (-20.212163074, -8.809805691), (-19.032354771, -8.158486898))
                ThreePointArc((-19.032354771, -8.158486898), (-19.70016616, -7.361599771), (-20.297057711, -6.510293938))
                ThreePointArc((-20.297057711, -6.510293938), (-21.231540213, -7.48132754), (-21.896479694, -8.65351323))
                ThreePointArc((-21.896479694, -8.65351323), (-21.709135156, -8.903135899), (-21.516506507, -9.148703928))
            make_face()
            with BuildLine():
                ThreePointArc((-21.942853375, 2.47620963), (-21.92946485, 2.539366405), (-21.915739337, 2.602450802))
                ThreePointArc((-21.915739337, 2.602450802), (-23.263142697, 2.576605271), (-24.562186363, 2.217928037))
                ThreePointArc((-24.562186363, 2.217928037), (-24.56889027, 2.173784387), (-24.575459377, 2.129620475))
                Line((-24.575459377, 2.129620475), (-21.942853375, 2.47620963))
            make_face()
            with BuildLine():
                ThreePointArc((-23.495573413, -5.883801663), (-22.147961087, -5.894040025), (-20.839780068, -5.57027124))
                ThreePointArc((-20.839780068, -5.57027124), (-20.869365339, -5.512888815), (-20.898643838, -5.455349261))
                Line((-20.898643838, -5.455349261), (-23.531249839, -5.801938416))
                ThreePointArc((-23.531249839, -5.801938416), (-23.513474108, -5.842897269), (-23.495573413, -5.883801663))
            make_face()
        extrude(amount=CUT_EXTRUDE1_DEPTH, mode=Mode.SUBTRACT)

    # Sketch5 → Cut-Extrude2 (cut, up to next)
    with BuildSketch(Plane(origin=(0, 4, 0), x_dir=(1, 0, 0), z_dir=(0, 1, 0)), mode=Mode.PRIVATE) as cut_extrude2_sk1:
        with Locations(Location((-10.106342554, 0, 0), (0, 0, 270))):
            Circle(SKETCH5_R)
    cut_extrude2_tool1 = extrude(cut_extrude2_sk1.sketch, amount=-CUT_EXTRUDE2_REACH, mode=Mode.PRIVATE) & part.part
    add(cut_extrude2_tool1.solids().sort_by_distance((-10.106343, 4, 0))[0], mode=Mode.SUBTRACT)

    # Sketch6 → Boss-Extrude3 (add)
    with SkipClean():  # the faces are left unmerged after this step: merging them gives an invalid solid
        with BuildSketch(Plane(origin=(0, 0, 0), x_dir=(-1, 0, 0), z_dir=(0, -1, 0))):
            with Locations(Location((10.106342554, 0, 0), (0, 0, 270))):
                Circle(SKETCH6_R)
        extrude(amount=BOSS_EXTRUDE3_DEPTH)

    # Sketch7 → Cut-Extrude3 (cut, through all)
    with SkipClean():  # the faces are left unmerged after this step: merging them gives an invalid solid
        with BuildSketch(Plane.XZ.offset(1.5)):
            with Locations(Location((-10.106342554, 0, 0), (0, 0, 270))):
                Circle(SKETCH7_R)
        extrude(amount=-CUT_EXTRUDE3_DEPTH, mode=Mode.SUBTRACT)


solid = part.part
